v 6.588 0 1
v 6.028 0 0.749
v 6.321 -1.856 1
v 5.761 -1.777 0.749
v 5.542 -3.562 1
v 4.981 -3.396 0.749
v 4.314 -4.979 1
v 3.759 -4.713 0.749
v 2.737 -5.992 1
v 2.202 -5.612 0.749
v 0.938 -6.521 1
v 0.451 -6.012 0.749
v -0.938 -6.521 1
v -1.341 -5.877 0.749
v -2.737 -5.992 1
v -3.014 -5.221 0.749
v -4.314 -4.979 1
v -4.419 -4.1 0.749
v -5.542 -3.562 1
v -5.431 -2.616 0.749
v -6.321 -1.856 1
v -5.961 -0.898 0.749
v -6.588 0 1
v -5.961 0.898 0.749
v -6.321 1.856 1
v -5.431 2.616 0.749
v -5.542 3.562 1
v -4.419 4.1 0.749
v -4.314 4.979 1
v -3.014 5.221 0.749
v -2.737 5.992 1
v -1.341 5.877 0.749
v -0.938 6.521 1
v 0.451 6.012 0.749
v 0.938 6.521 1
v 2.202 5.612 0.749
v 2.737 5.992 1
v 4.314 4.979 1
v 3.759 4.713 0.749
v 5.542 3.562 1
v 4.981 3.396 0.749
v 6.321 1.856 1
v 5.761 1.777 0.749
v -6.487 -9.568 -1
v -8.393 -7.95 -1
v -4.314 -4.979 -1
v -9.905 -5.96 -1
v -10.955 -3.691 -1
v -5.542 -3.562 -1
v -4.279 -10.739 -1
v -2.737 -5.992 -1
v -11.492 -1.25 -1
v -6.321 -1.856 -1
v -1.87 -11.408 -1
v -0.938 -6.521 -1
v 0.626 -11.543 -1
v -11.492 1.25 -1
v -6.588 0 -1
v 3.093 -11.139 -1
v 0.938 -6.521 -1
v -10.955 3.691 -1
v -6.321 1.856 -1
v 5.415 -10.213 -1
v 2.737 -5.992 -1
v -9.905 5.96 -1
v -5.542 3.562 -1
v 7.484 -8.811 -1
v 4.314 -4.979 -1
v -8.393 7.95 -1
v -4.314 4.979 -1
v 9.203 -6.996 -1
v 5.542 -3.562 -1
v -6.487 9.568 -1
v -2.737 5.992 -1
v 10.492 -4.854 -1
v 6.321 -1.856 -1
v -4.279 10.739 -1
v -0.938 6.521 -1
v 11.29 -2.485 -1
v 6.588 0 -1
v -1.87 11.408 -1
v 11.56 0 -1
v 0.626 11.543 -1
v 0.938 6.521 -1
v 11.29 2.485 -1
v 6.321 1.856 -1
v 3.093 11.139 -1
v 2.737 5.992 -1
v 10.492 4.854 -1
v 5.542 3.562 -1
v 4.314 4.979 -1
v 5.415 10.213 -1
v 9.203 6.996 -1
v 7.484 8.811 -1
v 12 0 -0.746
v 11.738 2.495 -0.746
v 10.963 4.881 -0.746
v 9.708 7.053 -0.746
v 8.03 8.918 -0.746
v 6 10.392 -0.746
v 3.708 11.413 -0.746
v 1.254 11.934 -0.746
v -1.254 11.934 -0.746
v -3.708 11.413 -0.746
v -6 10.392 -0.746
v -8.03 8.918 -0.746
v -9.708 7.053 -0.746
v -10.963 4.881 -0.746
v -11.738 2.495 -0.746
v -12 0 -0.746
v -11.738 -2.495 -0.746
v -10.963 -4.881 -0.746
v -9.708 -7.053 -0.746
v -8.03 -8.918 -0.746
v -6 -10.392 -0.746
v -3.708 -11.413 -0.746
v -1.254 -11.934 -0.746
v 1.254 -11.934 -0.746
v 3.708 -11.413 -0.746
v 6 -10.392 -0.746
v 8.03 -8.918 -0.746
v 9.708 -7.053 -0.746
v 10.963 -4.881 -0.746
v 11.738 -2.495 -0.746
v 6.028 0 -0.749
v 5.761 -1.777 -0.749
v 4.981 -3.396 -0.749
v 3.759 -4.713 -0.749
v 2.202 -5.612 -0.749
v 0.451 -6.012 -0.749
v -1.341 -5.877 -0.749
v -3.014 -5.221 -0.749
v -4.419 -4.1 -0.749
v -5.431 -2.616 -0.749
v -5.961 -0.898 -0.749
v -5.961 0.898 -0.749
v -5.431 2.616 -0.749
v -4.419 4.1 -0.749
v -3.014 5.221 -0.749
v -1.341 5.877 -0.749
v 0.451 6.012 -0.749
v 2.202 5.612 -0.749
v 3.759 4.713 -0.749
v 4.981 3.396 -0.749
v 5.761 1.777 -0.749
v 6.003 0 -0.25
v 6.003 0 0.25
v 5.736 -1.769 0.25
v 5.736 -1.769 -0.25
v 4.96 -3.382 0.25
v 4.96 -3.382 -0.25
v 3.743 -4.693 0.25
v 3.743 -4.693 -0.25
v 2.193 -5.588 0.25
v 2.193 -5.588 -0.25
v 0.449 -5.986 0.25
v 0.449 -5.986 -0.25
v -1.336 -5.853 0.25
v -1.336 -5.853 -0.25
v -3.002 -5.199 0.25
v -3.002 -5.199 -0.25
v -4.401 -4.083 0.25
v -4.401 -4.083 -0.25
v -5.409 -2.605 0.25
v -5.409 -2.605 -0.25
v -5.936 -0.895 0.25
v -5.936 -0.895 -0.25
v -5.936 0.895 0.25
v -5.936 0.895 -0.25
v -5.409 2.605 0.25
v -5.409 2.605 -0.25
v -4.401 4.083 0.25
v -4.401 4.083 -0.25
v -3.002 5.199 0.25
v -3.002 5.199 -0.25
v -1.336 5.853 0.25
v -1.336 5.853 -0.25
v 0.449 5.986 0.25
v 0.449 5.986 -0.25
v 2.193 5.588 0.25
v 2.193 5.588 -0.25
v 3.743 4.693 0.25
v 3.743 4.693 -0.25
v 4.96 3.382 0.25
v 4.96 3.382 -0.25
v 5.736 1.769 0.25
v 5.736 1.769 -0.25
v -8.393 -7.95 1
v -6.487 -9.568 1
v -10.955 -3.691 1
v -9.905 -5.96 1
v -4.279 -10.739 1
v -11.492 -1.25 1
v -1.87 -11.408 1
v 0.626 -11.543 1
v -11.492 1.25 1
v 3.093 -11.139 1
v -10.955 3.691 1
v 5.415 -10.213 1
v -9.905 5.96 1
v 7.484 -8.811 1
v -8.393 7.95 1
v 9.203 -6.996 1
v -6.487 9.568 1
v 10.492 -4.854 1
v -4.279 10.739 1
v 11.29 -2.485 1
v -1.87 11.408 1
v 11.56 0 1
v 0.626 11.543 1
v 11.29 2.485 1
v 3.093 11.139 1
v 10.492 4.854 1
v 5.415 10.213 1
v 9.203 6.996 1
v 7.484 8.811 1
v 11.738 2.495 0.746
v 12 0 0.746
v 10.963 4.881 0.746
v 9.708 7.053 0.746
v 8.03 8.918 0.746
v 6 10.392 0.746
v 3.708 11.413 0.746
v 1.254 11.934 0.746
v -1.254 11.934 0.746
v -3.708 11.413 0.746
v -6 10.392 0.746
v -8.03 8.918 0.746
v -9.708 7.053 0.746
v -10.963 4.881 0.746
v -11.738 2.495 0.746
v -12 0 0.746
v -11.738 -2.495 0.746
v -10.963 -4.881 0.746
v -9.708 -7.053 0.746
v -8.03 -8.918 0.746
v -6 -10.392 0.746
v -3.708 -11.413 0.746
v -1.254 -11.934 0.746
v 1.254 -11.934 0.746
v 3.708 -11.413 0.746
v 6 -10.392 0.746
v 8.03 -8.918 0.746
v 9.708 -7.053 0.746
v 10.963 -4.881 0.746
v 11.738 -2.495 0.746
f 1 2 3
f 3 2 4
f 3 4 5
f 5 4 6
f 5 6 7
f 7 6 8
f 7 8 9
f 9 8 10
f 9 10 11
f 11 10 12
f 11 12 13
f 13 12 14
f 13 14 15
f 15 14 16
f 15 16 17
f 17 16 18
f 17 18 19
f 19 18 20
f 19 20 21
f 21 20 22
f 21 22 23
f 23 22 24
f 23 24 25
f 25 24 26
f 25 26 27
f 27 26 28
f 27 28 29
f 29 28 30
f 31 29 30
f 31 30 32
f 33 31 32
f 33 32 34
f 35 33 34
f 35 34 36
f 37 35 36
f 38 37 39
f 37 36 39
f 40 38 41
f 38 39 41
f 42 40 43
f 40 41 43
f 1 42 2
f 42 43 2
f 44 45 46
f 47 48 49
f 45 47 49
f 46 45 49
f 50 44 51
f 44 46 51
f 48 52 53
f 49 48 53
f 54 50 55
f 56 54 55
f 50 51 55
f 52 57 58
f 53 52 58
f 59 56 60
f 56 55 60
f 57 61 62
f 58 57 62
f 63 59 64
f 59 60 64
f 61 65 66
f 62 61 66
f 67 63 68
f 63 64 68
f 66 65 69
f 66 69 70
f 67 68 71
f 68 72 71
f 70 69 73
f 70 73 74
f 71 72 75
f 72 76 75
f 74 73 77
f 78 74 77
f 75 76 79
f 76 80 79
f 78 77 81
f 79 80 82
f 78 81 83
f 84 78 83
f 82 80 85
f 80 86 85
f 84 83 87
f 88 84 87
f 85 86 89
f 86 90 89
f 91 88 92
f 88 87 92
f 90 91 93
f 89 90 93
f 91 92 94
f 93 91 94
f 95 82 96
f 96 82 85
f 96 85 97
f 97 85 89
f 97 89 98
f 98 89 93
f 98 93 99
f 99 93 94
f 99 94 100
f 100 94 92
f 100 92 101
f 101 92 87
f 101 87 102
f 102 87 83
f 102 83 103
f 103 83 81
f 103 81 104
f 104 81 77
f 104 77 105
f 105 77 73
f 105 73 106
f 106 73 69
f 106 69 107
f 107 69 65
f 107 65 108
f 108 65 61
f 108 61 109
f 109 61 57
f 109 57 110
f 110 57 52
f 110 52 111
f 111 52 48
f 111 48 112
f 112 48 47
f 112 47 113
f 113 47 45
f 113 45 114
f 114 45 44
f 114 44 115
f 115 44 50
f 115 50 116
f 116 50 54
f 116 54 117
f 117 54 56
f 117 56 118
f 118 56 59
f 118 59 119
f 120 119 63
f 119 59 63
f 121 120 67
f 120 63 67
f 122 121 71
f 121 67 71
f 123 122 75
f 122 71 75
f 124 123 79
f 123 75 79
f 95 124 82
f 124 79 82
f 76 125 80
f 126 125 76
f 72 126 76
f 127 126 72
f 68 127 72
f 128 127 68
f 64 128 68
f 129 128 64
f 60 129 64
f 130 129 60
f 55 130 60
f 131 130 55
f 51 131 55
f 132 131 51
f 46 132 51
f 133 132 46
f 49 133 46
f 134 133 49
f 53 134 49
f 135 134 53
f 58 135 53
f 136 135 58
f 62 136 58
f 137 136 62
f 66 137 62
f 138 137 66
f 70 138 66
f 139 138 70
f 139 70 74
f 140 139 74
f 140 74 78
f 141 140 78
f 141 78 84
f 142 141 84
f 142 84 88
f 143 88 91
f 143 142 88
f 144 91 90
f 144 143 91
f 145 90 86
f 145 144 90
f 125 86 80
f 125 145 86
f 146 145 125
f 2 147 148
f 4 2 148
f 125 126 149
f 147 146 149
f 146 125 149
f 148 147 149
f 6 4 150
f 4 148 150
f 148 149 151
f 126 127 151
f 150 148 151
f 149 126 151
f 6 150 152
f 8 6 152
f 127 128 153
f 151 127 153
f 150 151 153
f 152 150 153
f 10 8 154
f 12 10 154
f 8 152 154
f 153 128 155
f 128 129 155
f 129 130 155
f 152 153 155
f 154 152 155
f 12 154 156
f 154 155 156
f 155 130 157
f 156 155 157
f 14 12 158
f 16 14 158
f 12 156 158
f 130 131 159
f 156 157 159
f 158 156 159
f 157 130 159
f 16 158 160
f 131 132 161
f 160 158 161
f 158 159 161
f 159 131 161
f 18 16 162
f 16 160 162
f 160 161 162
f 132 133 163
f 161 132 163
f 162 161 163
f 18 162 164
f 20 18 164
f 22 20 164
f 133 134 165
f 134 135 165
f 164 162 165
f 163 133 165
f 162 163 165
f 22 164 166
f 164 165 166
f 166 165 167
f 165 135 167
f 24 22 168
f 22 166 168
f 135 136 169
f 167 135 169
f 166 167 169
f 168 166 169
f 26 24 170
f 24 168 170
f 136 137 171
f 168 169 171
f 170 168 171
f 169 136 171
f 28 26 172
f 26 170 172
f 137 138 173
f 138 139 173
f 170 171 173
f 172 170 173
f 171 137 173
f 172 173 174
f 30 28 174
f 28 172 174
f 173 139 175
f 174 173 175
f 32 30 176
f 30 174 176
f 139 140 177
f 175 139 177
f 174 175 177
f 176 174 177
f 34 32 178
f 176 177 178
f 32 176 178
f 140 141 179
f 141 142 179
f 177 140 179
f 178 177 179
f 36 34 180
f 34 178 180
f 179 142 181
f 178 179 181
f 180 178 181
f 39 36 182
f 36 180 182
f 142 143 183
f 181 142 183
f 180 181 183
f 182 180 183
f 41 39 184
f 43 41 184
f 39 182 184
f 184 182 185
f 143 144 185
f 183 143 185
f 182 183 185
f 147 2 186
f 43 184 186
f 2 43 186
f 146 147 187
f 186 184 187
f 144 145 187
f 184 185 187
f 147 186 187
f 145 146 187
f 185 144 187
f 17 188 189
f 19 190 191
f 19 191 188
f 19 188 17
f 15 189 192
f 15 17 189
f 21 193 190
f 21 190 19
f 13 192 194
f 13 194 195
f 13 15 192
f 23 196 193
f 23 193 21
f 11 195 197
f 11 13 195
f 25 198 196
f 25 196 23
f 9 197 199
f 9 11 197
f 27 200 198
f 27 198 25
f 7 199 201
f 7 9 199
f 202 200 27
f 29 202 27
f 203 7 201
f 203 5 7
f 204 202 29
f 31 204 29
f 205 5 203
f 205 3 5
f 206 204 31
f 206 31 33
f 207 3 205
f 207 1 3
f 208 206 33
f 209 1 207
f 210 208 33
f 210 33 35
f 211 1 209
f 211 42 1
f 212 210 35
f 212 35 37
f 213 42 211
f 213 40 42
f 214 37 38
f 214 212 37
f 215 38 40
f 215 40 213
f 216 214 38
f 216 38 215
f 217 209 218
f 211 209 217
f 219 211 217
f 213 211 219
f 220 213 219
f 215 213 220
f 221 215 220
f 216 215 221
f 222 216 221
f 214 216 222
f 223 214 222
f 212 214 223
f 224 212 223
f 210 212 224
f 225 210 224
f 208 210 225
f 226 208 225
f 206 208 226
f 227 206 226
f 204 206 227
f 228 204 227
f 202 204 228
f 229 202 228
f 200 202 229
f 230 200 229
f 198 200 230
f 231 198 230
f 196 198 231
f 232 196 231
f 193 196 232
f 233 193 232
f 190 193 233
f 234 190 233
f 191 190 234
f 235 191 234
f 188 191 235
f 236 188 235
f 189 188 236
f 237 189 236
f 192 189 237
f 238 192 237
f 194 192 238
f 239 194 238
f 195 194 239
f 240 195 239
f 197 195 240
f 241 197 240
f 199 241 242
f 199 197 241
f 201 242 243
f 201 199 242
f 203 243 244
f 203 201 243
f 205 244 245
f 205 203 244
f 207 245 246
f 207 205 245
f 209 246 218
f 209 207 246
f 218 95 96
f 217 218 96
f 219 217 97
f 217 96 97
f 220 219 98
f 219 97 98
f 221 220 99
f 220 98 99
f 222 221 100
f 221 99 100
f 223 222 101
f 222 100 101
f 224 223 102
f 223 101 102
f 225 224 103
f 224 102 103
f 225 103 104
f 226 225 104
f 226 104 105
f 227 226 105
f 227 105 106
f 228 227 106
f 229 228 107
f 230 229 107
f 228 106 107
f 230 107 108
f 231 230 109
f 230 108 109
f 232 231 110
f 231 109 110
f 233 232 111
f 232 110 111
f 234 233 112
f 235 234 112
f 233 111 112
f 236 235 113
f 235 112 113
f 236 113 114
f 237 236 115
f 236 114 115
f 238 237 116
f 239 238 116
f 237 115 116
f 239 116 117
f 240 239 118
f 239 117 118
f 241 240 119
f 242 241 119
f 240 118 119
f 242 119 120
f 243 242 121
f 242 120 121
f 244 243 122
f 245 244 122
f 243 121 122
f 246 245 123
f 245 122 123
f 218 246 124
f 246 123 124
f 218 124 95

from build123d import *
from OCP.BRepFilletAPI import BRepFilletAPI_MakeChamfer

# Parameters (mm, degrees)
BOSS_EXTRUDE1_DEPTH      = 1
BOSS_EXTRUDE1_DEPTH_BACK = 1
SKETCH3_R                = 12
SKETCH3_R_2              = 6
CHAMFER1_SIZE            = 0.254
CHAMFER1_SIZE2           = 0.439940905
CHAMFER2_SIZE            = 0.536952942


with BuildPart() as part:
    # Sketch3 → Boss-Extrude1 (new, two sides: drawn at the far end of the back side and taken through both)
    with BuildSketch(Plane.XY.offset(-BOSS_EXTRUDE1_DEPTH_BACK)):
        Circle(SKETCH3_R)
        Circle(SKETCH3_R_2, mode=Mode.SUBTRACT)
    extrude(amount=BOSS_EXTRUDE1_DEPTH + BOSS_EXTRUDE1_DEPTH_BACK)

    # Chamfer1: one chamfer whose edges measure the first distance from different faces: ONE call of the kernel's chamfer builder (chamfer() names one face for all edges)
    chamfer1_edges_1 = [part.edges().sort_by_distance(p)[0] for p in [
        (-12, 0, 1),
    ]]
    chamfer1_side_1 = [part.faces().sort_by_distance(p)[0] for p in [
        (-12, 0, 0.5),
    ]]
    chamfer1_edges_2 = [part.edges().sort_by_distance(p)[0] for p in [
        (-12, 0, -1),
    ]]
    chamfer1_side_2 = [part.faces().sort_by_distance(p)[0] for p in [
        (-12, 0, -0.5),
    ]]
    chamfer1 = BRepFilletAPI_MakeChamfer(part.part.solid().wrapped)
    for e in chamfer1_edges_1:
        chamfer1.Add(CHAMFER1_SIZE, CHAMFER1_SIZE2, e.wrapped, chamfer1_side_1[0].wrapped)  # the first distance lies on this face
    for e in chamfer1_edges_2:
        chamfer1.Add(CHAMFER1_SIZE, CHAMFER1_SIZE2, e.wrapped, chamfer1_side_2[0].wrapped)  # the first distance lies on this face
    add(Compound.cast(chamfer1.Shape()), mode=Mode.REPLACE)

    # Sketch4 → Cut-Revolve1 (revolve, cut)
    with BuildSketch(Plane(origin=(0, 0, 0), x_dir=(0, 0, -1), z_dir=(1, 0, 0)), mode=Mode.PRIVATE) as cut_revolve1_sk:
        with BuildLine():
            Line((-1, 5.9492), (-1, 6.0508))
            ThreePointArc((-1, 6.0508), (0, 6), (1, 6.0508))
            Line((1, 6.0508), (1, 5.9492))
            Line((1, 5.9492), (-1, 5.9492))
        make_face()
    revolve(cut_revolve1_sk.sketch.rotate(Axis((0, 0, 1), (0, 0, -1)), 90), axis=Axis((0, 0, 1), (0, 0, -1)), mode=Mode.SUBTRACT)

    # Chamfer2
    # the kernel refuses this chamfer: 0.536952942, 0.254 mm, written as the material it takes off along each edge
    with BuildSketch(Plane(origin=(0, 0, -1), x_dir=(1, 0, 0), z_dir=(0, 1, 0))) as chamfer2_piece_1:
        with BuildLine():
            Line((6.0508 + CHAMFER2_SIZE, 0), (6.028453739, -0.251168371))
            ThreePointArc((6.028453739, -0.251168371), (6.038361074, -0.130738), (6.0508, 0))
            Line((6.0508, 0), (6.0508 + CHAMFER2_SIZE, 0))
        make_face()
    revolve(axis=Axis((0, 0, -1), (0, 0, -1)), mode=Mode.SUBTRACT)
    with BuildSketch(Plane(origin=(0, 0, 1), x_dir=(1, 0, 0), z_dir=(0, 1, 0))) as chamfer2_piece_2:
        with BuildLine():
            Line((6.0508 + CHAMFER2_SIZE, 0), (6.028453739, 0.251168371))
            ThreePointArc((6.028453739, 0.251168371), (6.038361074, 0.130738), (6.0508, 0))
            Line((6.0508, 0), (6.0508 + CHAMFER2_SIZE, 0))
        make_face()
    revolve(axis=Axis((0, 0, 1), (0, 0, -1)), mode=Mode.SUBTRACT)


solid = part.part
